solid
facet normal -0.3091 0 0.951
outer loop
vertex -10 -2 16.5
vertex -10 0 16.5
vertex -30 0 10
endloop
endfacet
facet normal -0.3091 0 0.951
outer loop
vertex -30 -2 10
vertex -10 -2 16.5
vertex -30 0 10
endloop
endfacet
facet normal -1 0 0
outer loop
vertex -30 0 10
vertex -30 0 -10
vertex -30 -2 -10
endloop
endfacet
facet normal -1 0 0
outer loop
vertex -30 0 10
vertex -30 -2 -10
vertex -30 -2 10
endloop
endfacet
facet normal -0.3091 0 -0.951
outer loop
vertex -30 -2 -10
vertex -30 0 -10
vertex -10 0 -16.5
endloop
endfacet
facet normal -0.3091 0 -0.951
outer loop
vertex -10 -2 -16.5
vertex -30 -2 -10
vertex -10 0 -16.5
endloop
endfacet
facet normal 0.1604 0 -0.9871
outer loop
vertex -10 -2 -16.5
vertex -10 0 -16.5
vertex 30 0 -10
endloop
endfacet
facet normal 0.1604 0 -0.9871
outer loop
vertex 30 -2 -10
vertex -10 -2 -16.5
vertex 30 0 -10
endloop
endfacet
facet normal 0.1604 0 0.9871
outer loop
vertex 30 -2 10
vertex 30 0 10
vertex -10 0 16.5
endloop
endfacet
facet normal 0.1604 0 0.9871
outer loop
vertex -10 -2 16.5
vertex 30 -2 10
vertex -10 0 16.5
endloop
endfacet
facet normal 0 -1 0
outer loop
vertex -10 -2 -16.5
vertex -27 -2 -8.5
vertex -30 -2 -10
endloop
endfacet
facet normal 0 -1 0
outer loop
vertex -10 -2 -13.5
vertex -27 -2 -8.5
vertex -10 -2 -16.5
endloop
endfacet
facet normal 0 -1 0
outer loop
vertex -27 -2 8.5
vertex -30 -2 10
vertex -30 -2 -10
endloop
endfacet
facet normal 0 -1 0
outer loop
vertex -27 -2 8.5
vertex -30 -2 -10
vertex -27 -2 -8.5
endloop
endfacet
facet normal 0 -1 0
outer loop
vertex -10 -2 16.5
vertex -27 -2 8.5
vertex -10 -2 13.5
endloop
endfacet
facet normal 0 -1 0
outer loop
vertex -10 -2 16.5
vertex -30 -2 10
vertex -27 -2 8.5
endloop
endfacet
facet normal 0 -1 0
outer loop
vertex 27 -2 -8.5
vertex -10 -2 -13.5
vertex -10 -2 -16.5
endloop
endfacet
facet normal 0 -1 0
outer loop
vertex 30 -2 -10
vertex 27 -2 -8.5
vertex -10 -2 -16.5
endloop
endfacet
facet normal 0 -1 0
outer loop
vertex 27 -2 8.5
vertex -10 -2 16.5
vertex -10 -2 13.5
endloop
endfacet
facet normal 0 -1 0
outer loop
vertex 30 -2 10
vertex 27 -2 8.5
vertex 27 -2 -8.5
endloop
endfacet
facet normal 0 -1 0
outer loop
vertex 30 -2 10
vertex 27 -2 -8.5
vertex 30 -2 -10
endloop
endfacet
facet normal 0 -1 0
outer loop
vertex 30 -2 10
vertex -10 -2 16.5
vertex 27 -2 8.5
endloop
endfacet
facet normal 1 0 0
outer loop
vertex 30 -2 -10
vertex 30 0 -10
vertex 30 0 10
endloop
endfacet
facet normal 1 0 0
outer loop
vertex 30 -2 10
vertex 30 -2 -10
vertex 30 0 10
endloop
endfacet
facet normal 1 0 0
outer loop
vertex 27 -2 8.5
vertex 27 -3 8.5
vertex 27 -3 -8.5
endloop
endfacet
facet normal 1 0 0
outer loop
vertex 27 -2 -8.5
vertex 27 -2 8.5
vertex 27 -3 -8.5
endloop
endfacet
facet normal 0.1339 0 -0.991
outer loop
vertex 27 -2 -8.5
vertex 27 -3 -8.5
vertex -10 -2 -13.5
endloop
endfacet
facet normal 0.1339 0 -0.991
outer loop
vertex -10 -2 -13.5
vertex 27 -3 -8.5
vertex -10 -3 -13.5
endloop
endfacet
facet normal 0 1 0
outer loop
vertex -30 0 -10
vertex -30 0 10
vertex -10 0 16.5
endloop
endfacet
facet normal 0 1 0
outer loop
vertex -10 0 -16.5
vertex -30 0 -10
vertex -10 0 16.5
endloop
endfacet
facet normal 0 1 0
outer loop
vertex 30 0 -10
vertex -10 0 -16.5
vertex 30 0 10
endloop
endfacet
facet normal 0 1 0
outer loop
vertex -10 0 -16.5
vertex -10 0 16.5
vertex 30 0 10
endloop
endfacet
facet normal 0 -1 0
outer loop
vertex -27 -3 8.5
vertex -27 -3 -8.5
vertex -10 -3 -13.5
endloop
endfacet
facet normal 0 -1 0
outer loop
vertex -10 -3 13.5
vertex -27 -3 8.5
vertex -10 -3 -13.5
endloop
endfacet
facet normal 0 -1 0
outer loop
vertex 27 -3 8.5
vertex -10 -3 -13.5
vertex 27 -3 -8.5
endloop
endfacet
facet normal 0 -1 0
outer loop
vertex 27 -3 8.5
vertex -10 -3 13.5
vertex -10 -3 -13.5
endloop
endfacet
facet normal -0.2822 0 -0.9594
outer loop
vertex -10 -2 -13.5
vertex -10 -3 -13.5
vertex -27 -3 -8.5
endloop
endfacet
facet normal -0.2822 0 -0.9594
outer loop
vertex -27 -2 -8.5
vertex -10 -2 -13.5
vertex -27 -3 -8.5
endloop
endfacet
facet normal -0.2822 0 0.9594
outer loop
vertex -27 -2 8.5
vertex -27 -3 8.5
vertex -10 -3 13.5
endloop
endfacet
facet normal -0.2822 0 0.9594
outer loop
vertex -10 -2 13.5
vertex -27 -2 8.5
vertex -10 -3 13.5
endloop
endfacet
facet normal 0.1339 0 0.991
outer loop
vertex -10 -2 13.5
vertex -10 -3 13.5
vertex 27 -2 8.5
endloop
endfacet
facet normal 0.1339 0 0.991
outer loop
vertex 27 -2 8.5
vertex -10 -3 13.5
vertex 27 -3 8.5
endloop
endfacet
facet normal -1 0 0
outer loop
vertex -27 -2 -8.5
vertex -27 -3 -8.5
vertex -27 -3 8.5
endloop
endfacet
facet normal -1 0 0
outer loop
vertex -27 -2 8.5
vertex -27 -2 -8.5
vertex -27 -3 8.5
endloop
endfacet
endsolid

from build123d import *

# Parameters (mm, degrees)
F0_W     = 20
F0_H     = 20
F0_W_2   = 40
F1_DEPTH = 3
F3_DEPTH = 1


with BuildPart() as f1:
    # F0 (on Front) → F1 (new body)
    with BuildSketch(Plane.XZ):
        with Locations((-20, 0)):
            Rectangle(F0_W, F0_H)
        Polygon((-30, 10), (-10, 10), (-10, 16.5), align=None)
        Polygon((-10, 10), (30, 10), (-10, 16.5), align=None)
        with Locations((10, 0)):
            Rectangle(F0_W_2, F0_H)
        Polygon((-10, -16.5), (30, -10), (-10, -10), align=None)
        Polygon((-10, -16.5), (-10, -10), (-30, -10), align=None)
    extrude(amount=F1_DEPTH)

    # F2 (on face) → F3 (cut)
    with BuildSketch(Plane.XZ.offset(3)):
        Polygon((-10, -16.5), (-10, -13.5), (-27, -8.5), (-27, 8.5), (-10, 13.5), (-10, 16.5), (-30, 10), (-30, -10), align=None)
        Polygon((27, 8.5), (27, -8.5), (-10, -13.5), (-10, -16.5), (30, -10), (30, 10), (-10, 16.5), (-10, 13.5), align=None)
    extrude(amount=-F3_DEPTH, mode=Mode.SUBTRACT)


solid = f1.part
